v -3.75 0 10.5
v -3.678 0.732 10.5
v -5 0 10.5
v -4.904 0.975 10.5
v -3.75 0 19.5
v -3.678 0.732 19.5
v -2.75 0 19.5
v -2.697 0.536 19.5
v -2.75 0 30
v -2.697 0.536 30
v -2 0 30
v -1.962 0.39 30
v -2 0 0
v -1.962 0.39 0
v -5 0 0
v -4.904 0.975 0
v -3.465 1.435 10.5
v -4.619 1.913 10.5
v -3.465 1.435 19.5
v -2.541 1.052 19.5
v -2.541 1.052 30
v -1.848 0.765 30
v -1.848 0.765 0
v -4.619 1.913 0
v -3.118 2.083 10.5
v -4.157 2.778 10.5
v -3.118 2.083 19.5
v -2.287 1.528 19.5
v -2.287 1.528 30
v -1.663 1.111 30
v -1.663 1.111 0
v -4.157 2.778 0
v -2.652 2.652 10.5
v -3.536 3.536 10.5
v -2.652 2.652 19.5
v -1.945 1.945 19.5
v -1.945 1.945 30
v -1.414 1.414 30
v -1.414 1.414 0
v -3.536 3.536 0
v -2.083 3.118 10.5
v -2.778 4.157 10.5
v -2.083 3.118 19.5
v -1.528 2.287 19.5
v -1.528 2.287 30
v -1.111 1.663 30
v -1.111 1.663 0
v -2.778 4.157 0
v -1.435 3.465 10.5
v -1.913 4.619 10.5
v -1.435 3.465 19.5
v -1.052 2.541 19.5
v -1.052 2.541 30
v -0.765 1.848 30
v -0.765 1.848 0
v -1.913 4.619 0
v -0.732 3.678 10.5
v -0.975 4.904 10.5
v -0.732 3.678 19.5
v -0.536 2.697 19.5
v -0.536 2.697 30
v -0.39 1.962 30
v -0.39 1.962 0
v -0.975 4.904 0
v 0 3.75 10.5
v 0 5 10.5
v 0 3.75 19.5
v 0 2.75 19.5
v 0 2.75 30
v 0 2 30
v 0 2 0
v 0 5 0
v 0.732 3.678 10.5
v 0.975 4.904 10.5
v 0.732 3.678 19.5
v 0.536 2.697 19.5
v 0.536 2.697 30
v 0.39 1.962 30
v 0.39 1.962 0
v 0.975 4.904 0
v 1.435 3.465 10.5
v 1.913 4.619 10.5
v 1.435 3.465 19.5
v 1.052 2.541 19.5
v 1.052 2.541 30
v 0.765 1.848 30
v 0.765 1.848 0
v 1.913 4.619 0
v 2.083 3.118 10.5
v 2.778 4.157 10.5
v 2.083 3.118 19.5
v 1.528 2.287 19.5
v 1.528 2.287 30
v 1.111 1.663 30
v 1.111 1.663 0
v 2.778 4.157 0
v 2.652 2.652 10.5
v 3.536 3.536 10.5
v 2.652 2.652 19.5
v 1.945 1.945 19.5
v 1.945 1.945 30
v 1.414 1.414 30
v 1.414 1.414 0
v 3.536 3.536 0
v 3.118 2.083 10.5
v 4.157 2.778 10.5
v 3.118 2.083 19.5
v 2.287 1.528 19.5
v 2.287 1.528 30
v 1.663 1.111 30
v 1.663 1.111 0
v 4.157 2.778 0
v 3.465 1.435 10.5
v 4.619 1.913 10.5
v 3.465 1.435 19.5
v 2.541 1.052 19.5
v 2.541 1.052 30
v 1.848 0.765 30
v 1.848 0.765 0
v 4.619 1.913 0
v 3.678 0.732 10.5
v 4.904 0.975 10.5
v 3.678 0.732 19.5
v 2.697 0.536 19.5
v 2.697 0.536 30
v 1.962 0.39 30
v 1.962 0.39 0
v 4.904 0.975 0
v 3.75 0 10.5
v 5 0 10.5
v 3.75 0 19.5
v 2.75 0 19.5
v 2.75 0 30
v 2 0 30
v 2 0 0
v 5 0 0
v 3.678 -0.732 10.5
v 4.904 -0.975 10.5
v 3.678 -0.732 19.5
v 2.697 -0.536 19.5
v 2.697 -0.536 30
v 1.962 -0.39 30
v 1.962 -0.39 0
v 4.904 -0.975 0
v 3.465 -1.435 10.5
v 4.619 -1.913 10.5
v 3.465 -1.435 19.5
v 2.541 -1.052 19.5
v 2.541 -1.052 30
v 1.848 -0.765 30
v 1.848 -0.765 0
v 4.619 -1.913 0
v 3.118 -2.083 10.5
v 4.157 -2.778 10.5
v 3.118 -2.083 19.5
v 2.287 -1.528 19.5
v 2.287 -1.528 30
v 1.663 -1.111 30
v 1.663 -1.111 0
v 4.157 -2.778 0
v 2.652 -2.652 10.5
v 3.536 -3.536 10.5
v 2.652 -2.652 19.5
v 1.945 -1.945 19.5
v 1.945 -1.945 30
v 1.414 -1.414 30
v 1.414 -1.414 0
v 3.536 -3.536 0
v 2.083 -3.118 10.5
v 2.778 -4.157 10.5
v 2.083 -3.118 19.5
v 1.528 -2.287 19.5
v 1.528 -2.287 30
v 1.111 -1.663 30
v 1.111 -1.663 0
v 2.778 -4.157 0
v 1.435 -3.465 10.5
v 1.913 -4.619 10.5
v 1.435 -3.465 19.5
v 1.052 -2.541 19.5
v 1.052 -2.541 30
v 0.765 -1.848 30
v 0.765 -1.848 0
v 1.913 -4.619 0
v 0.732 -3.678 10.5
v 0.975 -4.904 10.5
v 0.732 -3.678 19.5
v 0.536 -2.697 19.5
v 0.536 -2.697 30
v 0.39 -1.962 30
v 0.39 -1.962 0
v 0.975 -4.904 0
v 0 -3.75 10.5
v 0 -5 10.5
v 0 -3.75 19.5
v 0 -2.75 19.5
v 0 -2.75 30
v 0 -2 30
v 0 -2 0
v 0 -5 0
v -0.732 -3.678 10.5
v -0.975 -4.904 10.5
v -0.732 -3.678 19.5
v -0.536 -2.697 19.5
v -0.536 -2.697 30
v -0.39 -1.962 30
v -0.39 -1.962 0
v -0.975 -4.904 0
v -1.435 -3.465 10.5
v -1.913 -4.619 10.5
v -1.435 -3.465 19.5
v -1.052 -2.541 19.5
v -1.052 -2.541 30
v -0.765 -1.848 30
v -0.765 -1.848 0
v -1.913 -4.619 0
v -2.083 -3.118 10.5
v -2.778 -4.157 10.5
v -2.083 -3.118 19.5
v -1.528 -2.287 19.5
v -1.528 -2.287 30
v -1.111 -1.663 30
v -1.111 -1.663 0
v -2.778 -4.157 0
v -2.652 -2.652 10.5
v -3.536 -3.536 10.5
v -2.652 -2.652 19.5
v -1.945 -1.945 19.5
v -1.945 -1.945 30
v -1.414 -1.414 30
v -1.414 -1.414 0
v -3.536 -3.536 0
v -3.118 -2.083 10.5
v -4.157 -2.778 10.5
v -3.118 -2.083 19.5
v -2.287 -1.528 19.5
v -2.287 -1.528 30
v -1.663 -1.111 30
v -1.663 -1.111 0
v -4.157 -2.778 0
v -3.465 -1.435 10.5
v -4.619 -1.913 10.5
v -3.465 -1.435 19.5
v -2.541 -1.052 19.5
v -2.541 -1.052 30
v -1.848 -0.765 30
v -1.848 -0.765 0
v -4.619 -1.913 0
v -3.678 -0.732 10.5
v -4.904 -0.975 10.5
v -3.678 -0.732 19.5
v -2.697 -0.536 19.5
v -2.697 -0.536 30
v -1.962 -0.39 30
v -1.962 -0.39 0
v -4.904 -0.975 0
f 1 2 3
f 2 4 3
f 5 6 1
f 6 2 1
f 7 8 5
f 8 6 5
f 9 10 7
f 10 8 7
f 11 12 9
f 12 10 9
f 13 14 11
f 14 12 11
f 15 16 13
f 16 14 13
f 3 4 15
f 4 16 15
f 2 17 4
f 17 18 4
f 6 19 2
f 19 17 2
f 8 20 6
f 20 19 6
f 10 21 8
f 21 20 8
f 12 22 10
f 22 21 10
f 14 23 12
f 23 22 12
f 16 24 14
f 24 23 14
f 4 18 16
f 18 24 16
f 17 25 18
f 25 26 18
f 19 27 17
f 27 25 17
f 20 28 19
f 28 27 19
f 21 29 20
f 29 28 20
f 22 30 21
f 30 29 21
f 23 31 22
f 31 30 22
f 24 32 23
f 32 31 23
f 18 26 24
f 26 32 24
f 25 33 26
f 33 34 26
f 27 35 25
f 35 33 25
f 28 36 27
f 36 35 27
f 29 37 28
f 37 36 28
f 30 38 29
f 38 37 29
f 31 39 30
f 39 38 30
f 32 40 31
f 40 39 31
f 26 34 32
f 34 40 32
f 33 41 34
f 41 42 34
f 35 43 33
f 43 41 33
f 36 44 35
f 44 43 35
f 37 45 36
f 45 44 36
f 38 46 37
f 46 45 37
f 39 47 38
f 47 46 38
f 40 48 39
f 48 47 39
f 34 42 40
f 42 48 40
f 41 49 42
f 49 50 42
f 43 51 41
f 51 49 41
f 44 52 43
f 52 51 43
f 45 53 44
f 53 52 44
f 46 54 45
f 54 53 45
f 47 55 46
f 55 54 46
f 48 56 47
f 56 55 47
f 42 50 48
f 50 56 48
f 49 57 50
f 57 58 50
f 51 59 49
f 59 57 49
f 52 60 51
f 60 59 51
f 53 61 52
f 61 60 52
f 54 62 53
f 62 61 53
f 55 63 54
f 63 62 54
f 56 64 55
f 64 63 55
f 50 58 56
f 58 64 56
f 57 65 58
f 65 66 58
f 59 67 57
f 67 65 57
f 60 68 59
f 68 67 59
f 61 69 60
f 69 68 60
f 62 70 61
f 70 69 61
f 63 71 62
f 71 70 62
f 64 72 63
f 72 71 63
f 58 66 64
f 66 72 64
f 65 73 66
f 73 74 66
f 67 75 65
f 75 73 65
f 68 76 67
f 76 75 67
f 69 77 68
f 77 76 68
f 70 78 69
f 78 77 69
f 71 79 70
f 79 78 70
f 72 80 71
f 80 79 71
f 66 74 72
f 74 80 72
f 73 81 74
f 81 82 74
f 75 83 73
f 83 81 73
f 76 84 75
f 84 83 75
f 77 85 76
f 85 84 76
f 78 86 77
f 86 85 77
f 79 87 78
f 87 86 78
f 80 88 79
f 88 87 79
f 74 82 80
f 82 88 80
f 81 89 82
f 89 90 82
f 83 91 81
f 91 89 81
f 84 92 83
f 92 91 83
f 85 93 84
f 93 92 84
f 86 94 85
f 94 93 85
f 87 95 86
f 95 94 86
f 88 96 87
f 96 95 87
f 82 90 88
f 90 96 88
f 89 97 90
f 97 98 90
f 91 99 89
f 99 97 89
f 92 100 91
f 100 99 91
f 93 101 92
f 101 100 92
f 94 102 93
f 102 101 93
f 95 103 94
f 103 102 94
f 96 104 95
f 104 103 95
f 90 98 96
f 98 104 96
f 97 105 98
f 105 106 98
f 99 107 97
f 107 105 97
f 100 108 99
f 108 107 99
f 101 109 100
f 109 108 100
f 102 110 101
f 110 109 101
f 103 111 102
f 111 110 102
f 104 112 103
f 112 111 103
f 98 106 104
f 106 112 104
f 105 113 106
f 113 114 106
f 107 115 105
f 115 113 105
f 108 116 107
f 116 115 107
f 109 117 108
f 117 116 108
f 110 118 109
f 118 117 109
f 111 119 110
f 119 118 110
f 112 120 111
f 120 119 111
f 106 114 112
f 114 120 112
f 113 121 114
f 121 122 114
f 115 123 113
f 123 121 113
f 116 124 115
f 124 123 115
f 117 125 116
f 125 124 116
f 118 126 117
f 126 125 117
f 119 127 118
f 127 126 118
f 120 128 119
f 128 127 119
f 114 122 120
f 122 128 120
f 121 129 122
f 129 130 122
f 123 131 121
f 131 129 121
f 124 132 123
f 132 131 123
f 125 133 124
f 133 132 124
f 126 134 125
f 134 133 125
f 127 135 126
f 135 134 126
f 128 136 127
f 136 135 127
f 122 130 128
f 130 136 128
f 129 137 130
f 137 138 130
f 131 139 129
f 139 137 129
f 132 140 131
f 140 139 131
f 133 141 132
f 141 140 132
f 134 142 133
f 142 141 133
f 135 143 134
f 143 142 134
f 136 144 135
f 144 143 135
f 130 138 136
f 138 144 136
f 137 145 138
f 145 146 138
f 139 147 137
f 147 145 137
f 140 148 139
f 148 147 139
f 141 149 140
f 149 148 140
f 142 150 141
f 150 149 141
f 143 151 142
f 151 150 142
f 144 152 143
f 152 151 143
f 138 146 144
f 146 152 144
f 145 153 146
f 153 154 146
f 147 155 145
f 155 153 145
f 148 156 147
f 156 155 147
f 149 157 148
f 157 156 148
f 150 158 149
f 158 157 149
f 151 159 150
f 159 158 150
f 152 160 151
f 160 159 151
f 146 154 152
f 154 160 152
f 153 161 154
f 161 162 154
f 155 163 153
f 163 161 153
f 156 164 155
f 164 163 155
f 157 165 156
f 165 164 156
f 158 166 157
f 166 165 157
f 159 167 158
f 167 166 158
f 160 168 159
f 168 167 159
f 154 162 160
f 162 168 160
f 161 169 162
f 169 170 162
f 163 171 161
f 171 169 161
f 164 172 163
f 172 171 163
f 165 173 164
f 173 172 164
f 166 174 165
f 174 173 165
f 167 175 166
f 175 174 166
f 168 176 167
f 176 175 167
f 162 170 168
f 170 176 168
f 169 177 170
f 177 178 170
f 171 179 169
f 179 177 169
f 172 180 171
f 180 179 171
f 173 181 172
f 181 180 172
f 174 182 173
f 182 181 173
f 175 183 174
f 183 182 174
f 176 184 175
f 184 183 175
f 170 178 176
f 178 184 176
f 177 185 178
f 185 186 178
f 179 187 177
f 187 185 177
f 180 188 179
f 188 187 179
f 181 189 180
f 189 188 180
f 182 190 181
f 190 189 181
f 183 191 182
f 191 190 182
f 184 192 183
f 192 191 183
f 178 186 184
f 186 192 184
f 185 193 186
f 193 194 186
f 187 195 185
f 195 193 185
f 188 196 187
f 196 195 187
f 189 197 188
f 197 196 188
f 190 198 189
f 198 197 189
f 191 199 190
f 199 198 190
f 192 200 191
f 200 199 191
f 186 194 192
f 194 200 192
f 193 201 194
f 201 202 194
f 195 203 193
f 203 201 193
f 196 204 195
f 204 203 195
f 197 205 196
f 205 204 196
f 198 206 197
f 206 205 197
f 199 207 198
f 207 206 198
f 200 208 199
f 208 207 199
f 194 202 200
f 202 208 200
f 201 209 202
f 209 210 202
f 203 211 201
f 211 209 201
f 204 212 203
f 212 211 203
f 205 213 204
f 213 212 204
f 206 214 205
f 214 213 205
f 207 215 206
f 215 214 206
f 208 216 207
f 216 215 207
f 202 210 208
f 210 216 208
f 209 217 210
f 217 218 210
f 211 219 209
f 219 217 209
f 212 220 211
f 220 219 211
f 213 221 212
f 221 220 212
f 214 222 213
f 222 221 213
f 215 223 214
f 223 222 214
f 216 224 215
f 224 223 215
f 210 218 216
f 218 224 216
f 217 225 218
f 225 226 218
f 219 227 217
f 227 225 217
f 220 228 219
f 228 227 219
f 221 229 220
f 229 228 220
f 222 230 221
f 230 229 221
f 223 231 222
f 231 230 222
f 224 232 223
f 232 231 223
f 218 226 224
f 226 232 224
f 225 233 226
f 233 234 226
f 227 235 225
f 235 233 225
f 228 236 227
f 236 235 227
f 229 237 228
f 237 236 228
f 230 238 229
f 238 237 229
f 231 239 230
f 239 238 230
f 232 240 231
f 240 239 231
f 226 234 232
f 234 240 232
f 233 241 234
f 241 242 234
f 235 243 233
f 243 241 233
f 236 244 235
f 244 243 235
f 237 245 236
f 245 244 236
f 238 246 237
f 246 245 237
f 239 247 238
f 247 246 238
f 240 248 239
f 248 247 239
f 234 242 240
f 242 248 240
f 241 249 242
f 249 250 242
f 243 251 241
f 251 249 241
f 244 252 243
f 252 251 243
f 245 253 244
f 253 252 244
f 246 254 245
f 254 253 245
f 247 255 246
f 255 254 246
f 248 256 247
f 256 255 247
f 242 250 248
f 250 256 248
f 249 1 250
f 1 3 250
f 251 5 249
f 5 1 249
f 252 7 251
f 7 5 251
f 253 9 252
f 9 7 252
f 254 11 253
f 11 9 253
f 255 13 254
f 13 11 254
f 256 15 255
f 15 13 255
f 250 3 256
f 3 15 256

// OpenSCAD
$fn = 32;

// ----------------------------------------------------------------------
// Profiled standoff: stepped spacer, 30 mm long, bore 4 mm
// ----------------------------------------------------------------------

// --- parameters (mm) ---
revolve_angle = 360;      // full turn around the Z axis
profile_points = 8;       // points of the closed outline

profile = [[2, 0], [5, 0], [5, 10.5], [3.75, 10.5], [3.75, 19.5], [2.75, 19.5], [2.75, 30], [2, 30]];  // single closed polygon, 8 points, counter clockwise

// --- the one profile operation ---
rotate_extrude(angle = revolve_angle) polygon(points = profile);
